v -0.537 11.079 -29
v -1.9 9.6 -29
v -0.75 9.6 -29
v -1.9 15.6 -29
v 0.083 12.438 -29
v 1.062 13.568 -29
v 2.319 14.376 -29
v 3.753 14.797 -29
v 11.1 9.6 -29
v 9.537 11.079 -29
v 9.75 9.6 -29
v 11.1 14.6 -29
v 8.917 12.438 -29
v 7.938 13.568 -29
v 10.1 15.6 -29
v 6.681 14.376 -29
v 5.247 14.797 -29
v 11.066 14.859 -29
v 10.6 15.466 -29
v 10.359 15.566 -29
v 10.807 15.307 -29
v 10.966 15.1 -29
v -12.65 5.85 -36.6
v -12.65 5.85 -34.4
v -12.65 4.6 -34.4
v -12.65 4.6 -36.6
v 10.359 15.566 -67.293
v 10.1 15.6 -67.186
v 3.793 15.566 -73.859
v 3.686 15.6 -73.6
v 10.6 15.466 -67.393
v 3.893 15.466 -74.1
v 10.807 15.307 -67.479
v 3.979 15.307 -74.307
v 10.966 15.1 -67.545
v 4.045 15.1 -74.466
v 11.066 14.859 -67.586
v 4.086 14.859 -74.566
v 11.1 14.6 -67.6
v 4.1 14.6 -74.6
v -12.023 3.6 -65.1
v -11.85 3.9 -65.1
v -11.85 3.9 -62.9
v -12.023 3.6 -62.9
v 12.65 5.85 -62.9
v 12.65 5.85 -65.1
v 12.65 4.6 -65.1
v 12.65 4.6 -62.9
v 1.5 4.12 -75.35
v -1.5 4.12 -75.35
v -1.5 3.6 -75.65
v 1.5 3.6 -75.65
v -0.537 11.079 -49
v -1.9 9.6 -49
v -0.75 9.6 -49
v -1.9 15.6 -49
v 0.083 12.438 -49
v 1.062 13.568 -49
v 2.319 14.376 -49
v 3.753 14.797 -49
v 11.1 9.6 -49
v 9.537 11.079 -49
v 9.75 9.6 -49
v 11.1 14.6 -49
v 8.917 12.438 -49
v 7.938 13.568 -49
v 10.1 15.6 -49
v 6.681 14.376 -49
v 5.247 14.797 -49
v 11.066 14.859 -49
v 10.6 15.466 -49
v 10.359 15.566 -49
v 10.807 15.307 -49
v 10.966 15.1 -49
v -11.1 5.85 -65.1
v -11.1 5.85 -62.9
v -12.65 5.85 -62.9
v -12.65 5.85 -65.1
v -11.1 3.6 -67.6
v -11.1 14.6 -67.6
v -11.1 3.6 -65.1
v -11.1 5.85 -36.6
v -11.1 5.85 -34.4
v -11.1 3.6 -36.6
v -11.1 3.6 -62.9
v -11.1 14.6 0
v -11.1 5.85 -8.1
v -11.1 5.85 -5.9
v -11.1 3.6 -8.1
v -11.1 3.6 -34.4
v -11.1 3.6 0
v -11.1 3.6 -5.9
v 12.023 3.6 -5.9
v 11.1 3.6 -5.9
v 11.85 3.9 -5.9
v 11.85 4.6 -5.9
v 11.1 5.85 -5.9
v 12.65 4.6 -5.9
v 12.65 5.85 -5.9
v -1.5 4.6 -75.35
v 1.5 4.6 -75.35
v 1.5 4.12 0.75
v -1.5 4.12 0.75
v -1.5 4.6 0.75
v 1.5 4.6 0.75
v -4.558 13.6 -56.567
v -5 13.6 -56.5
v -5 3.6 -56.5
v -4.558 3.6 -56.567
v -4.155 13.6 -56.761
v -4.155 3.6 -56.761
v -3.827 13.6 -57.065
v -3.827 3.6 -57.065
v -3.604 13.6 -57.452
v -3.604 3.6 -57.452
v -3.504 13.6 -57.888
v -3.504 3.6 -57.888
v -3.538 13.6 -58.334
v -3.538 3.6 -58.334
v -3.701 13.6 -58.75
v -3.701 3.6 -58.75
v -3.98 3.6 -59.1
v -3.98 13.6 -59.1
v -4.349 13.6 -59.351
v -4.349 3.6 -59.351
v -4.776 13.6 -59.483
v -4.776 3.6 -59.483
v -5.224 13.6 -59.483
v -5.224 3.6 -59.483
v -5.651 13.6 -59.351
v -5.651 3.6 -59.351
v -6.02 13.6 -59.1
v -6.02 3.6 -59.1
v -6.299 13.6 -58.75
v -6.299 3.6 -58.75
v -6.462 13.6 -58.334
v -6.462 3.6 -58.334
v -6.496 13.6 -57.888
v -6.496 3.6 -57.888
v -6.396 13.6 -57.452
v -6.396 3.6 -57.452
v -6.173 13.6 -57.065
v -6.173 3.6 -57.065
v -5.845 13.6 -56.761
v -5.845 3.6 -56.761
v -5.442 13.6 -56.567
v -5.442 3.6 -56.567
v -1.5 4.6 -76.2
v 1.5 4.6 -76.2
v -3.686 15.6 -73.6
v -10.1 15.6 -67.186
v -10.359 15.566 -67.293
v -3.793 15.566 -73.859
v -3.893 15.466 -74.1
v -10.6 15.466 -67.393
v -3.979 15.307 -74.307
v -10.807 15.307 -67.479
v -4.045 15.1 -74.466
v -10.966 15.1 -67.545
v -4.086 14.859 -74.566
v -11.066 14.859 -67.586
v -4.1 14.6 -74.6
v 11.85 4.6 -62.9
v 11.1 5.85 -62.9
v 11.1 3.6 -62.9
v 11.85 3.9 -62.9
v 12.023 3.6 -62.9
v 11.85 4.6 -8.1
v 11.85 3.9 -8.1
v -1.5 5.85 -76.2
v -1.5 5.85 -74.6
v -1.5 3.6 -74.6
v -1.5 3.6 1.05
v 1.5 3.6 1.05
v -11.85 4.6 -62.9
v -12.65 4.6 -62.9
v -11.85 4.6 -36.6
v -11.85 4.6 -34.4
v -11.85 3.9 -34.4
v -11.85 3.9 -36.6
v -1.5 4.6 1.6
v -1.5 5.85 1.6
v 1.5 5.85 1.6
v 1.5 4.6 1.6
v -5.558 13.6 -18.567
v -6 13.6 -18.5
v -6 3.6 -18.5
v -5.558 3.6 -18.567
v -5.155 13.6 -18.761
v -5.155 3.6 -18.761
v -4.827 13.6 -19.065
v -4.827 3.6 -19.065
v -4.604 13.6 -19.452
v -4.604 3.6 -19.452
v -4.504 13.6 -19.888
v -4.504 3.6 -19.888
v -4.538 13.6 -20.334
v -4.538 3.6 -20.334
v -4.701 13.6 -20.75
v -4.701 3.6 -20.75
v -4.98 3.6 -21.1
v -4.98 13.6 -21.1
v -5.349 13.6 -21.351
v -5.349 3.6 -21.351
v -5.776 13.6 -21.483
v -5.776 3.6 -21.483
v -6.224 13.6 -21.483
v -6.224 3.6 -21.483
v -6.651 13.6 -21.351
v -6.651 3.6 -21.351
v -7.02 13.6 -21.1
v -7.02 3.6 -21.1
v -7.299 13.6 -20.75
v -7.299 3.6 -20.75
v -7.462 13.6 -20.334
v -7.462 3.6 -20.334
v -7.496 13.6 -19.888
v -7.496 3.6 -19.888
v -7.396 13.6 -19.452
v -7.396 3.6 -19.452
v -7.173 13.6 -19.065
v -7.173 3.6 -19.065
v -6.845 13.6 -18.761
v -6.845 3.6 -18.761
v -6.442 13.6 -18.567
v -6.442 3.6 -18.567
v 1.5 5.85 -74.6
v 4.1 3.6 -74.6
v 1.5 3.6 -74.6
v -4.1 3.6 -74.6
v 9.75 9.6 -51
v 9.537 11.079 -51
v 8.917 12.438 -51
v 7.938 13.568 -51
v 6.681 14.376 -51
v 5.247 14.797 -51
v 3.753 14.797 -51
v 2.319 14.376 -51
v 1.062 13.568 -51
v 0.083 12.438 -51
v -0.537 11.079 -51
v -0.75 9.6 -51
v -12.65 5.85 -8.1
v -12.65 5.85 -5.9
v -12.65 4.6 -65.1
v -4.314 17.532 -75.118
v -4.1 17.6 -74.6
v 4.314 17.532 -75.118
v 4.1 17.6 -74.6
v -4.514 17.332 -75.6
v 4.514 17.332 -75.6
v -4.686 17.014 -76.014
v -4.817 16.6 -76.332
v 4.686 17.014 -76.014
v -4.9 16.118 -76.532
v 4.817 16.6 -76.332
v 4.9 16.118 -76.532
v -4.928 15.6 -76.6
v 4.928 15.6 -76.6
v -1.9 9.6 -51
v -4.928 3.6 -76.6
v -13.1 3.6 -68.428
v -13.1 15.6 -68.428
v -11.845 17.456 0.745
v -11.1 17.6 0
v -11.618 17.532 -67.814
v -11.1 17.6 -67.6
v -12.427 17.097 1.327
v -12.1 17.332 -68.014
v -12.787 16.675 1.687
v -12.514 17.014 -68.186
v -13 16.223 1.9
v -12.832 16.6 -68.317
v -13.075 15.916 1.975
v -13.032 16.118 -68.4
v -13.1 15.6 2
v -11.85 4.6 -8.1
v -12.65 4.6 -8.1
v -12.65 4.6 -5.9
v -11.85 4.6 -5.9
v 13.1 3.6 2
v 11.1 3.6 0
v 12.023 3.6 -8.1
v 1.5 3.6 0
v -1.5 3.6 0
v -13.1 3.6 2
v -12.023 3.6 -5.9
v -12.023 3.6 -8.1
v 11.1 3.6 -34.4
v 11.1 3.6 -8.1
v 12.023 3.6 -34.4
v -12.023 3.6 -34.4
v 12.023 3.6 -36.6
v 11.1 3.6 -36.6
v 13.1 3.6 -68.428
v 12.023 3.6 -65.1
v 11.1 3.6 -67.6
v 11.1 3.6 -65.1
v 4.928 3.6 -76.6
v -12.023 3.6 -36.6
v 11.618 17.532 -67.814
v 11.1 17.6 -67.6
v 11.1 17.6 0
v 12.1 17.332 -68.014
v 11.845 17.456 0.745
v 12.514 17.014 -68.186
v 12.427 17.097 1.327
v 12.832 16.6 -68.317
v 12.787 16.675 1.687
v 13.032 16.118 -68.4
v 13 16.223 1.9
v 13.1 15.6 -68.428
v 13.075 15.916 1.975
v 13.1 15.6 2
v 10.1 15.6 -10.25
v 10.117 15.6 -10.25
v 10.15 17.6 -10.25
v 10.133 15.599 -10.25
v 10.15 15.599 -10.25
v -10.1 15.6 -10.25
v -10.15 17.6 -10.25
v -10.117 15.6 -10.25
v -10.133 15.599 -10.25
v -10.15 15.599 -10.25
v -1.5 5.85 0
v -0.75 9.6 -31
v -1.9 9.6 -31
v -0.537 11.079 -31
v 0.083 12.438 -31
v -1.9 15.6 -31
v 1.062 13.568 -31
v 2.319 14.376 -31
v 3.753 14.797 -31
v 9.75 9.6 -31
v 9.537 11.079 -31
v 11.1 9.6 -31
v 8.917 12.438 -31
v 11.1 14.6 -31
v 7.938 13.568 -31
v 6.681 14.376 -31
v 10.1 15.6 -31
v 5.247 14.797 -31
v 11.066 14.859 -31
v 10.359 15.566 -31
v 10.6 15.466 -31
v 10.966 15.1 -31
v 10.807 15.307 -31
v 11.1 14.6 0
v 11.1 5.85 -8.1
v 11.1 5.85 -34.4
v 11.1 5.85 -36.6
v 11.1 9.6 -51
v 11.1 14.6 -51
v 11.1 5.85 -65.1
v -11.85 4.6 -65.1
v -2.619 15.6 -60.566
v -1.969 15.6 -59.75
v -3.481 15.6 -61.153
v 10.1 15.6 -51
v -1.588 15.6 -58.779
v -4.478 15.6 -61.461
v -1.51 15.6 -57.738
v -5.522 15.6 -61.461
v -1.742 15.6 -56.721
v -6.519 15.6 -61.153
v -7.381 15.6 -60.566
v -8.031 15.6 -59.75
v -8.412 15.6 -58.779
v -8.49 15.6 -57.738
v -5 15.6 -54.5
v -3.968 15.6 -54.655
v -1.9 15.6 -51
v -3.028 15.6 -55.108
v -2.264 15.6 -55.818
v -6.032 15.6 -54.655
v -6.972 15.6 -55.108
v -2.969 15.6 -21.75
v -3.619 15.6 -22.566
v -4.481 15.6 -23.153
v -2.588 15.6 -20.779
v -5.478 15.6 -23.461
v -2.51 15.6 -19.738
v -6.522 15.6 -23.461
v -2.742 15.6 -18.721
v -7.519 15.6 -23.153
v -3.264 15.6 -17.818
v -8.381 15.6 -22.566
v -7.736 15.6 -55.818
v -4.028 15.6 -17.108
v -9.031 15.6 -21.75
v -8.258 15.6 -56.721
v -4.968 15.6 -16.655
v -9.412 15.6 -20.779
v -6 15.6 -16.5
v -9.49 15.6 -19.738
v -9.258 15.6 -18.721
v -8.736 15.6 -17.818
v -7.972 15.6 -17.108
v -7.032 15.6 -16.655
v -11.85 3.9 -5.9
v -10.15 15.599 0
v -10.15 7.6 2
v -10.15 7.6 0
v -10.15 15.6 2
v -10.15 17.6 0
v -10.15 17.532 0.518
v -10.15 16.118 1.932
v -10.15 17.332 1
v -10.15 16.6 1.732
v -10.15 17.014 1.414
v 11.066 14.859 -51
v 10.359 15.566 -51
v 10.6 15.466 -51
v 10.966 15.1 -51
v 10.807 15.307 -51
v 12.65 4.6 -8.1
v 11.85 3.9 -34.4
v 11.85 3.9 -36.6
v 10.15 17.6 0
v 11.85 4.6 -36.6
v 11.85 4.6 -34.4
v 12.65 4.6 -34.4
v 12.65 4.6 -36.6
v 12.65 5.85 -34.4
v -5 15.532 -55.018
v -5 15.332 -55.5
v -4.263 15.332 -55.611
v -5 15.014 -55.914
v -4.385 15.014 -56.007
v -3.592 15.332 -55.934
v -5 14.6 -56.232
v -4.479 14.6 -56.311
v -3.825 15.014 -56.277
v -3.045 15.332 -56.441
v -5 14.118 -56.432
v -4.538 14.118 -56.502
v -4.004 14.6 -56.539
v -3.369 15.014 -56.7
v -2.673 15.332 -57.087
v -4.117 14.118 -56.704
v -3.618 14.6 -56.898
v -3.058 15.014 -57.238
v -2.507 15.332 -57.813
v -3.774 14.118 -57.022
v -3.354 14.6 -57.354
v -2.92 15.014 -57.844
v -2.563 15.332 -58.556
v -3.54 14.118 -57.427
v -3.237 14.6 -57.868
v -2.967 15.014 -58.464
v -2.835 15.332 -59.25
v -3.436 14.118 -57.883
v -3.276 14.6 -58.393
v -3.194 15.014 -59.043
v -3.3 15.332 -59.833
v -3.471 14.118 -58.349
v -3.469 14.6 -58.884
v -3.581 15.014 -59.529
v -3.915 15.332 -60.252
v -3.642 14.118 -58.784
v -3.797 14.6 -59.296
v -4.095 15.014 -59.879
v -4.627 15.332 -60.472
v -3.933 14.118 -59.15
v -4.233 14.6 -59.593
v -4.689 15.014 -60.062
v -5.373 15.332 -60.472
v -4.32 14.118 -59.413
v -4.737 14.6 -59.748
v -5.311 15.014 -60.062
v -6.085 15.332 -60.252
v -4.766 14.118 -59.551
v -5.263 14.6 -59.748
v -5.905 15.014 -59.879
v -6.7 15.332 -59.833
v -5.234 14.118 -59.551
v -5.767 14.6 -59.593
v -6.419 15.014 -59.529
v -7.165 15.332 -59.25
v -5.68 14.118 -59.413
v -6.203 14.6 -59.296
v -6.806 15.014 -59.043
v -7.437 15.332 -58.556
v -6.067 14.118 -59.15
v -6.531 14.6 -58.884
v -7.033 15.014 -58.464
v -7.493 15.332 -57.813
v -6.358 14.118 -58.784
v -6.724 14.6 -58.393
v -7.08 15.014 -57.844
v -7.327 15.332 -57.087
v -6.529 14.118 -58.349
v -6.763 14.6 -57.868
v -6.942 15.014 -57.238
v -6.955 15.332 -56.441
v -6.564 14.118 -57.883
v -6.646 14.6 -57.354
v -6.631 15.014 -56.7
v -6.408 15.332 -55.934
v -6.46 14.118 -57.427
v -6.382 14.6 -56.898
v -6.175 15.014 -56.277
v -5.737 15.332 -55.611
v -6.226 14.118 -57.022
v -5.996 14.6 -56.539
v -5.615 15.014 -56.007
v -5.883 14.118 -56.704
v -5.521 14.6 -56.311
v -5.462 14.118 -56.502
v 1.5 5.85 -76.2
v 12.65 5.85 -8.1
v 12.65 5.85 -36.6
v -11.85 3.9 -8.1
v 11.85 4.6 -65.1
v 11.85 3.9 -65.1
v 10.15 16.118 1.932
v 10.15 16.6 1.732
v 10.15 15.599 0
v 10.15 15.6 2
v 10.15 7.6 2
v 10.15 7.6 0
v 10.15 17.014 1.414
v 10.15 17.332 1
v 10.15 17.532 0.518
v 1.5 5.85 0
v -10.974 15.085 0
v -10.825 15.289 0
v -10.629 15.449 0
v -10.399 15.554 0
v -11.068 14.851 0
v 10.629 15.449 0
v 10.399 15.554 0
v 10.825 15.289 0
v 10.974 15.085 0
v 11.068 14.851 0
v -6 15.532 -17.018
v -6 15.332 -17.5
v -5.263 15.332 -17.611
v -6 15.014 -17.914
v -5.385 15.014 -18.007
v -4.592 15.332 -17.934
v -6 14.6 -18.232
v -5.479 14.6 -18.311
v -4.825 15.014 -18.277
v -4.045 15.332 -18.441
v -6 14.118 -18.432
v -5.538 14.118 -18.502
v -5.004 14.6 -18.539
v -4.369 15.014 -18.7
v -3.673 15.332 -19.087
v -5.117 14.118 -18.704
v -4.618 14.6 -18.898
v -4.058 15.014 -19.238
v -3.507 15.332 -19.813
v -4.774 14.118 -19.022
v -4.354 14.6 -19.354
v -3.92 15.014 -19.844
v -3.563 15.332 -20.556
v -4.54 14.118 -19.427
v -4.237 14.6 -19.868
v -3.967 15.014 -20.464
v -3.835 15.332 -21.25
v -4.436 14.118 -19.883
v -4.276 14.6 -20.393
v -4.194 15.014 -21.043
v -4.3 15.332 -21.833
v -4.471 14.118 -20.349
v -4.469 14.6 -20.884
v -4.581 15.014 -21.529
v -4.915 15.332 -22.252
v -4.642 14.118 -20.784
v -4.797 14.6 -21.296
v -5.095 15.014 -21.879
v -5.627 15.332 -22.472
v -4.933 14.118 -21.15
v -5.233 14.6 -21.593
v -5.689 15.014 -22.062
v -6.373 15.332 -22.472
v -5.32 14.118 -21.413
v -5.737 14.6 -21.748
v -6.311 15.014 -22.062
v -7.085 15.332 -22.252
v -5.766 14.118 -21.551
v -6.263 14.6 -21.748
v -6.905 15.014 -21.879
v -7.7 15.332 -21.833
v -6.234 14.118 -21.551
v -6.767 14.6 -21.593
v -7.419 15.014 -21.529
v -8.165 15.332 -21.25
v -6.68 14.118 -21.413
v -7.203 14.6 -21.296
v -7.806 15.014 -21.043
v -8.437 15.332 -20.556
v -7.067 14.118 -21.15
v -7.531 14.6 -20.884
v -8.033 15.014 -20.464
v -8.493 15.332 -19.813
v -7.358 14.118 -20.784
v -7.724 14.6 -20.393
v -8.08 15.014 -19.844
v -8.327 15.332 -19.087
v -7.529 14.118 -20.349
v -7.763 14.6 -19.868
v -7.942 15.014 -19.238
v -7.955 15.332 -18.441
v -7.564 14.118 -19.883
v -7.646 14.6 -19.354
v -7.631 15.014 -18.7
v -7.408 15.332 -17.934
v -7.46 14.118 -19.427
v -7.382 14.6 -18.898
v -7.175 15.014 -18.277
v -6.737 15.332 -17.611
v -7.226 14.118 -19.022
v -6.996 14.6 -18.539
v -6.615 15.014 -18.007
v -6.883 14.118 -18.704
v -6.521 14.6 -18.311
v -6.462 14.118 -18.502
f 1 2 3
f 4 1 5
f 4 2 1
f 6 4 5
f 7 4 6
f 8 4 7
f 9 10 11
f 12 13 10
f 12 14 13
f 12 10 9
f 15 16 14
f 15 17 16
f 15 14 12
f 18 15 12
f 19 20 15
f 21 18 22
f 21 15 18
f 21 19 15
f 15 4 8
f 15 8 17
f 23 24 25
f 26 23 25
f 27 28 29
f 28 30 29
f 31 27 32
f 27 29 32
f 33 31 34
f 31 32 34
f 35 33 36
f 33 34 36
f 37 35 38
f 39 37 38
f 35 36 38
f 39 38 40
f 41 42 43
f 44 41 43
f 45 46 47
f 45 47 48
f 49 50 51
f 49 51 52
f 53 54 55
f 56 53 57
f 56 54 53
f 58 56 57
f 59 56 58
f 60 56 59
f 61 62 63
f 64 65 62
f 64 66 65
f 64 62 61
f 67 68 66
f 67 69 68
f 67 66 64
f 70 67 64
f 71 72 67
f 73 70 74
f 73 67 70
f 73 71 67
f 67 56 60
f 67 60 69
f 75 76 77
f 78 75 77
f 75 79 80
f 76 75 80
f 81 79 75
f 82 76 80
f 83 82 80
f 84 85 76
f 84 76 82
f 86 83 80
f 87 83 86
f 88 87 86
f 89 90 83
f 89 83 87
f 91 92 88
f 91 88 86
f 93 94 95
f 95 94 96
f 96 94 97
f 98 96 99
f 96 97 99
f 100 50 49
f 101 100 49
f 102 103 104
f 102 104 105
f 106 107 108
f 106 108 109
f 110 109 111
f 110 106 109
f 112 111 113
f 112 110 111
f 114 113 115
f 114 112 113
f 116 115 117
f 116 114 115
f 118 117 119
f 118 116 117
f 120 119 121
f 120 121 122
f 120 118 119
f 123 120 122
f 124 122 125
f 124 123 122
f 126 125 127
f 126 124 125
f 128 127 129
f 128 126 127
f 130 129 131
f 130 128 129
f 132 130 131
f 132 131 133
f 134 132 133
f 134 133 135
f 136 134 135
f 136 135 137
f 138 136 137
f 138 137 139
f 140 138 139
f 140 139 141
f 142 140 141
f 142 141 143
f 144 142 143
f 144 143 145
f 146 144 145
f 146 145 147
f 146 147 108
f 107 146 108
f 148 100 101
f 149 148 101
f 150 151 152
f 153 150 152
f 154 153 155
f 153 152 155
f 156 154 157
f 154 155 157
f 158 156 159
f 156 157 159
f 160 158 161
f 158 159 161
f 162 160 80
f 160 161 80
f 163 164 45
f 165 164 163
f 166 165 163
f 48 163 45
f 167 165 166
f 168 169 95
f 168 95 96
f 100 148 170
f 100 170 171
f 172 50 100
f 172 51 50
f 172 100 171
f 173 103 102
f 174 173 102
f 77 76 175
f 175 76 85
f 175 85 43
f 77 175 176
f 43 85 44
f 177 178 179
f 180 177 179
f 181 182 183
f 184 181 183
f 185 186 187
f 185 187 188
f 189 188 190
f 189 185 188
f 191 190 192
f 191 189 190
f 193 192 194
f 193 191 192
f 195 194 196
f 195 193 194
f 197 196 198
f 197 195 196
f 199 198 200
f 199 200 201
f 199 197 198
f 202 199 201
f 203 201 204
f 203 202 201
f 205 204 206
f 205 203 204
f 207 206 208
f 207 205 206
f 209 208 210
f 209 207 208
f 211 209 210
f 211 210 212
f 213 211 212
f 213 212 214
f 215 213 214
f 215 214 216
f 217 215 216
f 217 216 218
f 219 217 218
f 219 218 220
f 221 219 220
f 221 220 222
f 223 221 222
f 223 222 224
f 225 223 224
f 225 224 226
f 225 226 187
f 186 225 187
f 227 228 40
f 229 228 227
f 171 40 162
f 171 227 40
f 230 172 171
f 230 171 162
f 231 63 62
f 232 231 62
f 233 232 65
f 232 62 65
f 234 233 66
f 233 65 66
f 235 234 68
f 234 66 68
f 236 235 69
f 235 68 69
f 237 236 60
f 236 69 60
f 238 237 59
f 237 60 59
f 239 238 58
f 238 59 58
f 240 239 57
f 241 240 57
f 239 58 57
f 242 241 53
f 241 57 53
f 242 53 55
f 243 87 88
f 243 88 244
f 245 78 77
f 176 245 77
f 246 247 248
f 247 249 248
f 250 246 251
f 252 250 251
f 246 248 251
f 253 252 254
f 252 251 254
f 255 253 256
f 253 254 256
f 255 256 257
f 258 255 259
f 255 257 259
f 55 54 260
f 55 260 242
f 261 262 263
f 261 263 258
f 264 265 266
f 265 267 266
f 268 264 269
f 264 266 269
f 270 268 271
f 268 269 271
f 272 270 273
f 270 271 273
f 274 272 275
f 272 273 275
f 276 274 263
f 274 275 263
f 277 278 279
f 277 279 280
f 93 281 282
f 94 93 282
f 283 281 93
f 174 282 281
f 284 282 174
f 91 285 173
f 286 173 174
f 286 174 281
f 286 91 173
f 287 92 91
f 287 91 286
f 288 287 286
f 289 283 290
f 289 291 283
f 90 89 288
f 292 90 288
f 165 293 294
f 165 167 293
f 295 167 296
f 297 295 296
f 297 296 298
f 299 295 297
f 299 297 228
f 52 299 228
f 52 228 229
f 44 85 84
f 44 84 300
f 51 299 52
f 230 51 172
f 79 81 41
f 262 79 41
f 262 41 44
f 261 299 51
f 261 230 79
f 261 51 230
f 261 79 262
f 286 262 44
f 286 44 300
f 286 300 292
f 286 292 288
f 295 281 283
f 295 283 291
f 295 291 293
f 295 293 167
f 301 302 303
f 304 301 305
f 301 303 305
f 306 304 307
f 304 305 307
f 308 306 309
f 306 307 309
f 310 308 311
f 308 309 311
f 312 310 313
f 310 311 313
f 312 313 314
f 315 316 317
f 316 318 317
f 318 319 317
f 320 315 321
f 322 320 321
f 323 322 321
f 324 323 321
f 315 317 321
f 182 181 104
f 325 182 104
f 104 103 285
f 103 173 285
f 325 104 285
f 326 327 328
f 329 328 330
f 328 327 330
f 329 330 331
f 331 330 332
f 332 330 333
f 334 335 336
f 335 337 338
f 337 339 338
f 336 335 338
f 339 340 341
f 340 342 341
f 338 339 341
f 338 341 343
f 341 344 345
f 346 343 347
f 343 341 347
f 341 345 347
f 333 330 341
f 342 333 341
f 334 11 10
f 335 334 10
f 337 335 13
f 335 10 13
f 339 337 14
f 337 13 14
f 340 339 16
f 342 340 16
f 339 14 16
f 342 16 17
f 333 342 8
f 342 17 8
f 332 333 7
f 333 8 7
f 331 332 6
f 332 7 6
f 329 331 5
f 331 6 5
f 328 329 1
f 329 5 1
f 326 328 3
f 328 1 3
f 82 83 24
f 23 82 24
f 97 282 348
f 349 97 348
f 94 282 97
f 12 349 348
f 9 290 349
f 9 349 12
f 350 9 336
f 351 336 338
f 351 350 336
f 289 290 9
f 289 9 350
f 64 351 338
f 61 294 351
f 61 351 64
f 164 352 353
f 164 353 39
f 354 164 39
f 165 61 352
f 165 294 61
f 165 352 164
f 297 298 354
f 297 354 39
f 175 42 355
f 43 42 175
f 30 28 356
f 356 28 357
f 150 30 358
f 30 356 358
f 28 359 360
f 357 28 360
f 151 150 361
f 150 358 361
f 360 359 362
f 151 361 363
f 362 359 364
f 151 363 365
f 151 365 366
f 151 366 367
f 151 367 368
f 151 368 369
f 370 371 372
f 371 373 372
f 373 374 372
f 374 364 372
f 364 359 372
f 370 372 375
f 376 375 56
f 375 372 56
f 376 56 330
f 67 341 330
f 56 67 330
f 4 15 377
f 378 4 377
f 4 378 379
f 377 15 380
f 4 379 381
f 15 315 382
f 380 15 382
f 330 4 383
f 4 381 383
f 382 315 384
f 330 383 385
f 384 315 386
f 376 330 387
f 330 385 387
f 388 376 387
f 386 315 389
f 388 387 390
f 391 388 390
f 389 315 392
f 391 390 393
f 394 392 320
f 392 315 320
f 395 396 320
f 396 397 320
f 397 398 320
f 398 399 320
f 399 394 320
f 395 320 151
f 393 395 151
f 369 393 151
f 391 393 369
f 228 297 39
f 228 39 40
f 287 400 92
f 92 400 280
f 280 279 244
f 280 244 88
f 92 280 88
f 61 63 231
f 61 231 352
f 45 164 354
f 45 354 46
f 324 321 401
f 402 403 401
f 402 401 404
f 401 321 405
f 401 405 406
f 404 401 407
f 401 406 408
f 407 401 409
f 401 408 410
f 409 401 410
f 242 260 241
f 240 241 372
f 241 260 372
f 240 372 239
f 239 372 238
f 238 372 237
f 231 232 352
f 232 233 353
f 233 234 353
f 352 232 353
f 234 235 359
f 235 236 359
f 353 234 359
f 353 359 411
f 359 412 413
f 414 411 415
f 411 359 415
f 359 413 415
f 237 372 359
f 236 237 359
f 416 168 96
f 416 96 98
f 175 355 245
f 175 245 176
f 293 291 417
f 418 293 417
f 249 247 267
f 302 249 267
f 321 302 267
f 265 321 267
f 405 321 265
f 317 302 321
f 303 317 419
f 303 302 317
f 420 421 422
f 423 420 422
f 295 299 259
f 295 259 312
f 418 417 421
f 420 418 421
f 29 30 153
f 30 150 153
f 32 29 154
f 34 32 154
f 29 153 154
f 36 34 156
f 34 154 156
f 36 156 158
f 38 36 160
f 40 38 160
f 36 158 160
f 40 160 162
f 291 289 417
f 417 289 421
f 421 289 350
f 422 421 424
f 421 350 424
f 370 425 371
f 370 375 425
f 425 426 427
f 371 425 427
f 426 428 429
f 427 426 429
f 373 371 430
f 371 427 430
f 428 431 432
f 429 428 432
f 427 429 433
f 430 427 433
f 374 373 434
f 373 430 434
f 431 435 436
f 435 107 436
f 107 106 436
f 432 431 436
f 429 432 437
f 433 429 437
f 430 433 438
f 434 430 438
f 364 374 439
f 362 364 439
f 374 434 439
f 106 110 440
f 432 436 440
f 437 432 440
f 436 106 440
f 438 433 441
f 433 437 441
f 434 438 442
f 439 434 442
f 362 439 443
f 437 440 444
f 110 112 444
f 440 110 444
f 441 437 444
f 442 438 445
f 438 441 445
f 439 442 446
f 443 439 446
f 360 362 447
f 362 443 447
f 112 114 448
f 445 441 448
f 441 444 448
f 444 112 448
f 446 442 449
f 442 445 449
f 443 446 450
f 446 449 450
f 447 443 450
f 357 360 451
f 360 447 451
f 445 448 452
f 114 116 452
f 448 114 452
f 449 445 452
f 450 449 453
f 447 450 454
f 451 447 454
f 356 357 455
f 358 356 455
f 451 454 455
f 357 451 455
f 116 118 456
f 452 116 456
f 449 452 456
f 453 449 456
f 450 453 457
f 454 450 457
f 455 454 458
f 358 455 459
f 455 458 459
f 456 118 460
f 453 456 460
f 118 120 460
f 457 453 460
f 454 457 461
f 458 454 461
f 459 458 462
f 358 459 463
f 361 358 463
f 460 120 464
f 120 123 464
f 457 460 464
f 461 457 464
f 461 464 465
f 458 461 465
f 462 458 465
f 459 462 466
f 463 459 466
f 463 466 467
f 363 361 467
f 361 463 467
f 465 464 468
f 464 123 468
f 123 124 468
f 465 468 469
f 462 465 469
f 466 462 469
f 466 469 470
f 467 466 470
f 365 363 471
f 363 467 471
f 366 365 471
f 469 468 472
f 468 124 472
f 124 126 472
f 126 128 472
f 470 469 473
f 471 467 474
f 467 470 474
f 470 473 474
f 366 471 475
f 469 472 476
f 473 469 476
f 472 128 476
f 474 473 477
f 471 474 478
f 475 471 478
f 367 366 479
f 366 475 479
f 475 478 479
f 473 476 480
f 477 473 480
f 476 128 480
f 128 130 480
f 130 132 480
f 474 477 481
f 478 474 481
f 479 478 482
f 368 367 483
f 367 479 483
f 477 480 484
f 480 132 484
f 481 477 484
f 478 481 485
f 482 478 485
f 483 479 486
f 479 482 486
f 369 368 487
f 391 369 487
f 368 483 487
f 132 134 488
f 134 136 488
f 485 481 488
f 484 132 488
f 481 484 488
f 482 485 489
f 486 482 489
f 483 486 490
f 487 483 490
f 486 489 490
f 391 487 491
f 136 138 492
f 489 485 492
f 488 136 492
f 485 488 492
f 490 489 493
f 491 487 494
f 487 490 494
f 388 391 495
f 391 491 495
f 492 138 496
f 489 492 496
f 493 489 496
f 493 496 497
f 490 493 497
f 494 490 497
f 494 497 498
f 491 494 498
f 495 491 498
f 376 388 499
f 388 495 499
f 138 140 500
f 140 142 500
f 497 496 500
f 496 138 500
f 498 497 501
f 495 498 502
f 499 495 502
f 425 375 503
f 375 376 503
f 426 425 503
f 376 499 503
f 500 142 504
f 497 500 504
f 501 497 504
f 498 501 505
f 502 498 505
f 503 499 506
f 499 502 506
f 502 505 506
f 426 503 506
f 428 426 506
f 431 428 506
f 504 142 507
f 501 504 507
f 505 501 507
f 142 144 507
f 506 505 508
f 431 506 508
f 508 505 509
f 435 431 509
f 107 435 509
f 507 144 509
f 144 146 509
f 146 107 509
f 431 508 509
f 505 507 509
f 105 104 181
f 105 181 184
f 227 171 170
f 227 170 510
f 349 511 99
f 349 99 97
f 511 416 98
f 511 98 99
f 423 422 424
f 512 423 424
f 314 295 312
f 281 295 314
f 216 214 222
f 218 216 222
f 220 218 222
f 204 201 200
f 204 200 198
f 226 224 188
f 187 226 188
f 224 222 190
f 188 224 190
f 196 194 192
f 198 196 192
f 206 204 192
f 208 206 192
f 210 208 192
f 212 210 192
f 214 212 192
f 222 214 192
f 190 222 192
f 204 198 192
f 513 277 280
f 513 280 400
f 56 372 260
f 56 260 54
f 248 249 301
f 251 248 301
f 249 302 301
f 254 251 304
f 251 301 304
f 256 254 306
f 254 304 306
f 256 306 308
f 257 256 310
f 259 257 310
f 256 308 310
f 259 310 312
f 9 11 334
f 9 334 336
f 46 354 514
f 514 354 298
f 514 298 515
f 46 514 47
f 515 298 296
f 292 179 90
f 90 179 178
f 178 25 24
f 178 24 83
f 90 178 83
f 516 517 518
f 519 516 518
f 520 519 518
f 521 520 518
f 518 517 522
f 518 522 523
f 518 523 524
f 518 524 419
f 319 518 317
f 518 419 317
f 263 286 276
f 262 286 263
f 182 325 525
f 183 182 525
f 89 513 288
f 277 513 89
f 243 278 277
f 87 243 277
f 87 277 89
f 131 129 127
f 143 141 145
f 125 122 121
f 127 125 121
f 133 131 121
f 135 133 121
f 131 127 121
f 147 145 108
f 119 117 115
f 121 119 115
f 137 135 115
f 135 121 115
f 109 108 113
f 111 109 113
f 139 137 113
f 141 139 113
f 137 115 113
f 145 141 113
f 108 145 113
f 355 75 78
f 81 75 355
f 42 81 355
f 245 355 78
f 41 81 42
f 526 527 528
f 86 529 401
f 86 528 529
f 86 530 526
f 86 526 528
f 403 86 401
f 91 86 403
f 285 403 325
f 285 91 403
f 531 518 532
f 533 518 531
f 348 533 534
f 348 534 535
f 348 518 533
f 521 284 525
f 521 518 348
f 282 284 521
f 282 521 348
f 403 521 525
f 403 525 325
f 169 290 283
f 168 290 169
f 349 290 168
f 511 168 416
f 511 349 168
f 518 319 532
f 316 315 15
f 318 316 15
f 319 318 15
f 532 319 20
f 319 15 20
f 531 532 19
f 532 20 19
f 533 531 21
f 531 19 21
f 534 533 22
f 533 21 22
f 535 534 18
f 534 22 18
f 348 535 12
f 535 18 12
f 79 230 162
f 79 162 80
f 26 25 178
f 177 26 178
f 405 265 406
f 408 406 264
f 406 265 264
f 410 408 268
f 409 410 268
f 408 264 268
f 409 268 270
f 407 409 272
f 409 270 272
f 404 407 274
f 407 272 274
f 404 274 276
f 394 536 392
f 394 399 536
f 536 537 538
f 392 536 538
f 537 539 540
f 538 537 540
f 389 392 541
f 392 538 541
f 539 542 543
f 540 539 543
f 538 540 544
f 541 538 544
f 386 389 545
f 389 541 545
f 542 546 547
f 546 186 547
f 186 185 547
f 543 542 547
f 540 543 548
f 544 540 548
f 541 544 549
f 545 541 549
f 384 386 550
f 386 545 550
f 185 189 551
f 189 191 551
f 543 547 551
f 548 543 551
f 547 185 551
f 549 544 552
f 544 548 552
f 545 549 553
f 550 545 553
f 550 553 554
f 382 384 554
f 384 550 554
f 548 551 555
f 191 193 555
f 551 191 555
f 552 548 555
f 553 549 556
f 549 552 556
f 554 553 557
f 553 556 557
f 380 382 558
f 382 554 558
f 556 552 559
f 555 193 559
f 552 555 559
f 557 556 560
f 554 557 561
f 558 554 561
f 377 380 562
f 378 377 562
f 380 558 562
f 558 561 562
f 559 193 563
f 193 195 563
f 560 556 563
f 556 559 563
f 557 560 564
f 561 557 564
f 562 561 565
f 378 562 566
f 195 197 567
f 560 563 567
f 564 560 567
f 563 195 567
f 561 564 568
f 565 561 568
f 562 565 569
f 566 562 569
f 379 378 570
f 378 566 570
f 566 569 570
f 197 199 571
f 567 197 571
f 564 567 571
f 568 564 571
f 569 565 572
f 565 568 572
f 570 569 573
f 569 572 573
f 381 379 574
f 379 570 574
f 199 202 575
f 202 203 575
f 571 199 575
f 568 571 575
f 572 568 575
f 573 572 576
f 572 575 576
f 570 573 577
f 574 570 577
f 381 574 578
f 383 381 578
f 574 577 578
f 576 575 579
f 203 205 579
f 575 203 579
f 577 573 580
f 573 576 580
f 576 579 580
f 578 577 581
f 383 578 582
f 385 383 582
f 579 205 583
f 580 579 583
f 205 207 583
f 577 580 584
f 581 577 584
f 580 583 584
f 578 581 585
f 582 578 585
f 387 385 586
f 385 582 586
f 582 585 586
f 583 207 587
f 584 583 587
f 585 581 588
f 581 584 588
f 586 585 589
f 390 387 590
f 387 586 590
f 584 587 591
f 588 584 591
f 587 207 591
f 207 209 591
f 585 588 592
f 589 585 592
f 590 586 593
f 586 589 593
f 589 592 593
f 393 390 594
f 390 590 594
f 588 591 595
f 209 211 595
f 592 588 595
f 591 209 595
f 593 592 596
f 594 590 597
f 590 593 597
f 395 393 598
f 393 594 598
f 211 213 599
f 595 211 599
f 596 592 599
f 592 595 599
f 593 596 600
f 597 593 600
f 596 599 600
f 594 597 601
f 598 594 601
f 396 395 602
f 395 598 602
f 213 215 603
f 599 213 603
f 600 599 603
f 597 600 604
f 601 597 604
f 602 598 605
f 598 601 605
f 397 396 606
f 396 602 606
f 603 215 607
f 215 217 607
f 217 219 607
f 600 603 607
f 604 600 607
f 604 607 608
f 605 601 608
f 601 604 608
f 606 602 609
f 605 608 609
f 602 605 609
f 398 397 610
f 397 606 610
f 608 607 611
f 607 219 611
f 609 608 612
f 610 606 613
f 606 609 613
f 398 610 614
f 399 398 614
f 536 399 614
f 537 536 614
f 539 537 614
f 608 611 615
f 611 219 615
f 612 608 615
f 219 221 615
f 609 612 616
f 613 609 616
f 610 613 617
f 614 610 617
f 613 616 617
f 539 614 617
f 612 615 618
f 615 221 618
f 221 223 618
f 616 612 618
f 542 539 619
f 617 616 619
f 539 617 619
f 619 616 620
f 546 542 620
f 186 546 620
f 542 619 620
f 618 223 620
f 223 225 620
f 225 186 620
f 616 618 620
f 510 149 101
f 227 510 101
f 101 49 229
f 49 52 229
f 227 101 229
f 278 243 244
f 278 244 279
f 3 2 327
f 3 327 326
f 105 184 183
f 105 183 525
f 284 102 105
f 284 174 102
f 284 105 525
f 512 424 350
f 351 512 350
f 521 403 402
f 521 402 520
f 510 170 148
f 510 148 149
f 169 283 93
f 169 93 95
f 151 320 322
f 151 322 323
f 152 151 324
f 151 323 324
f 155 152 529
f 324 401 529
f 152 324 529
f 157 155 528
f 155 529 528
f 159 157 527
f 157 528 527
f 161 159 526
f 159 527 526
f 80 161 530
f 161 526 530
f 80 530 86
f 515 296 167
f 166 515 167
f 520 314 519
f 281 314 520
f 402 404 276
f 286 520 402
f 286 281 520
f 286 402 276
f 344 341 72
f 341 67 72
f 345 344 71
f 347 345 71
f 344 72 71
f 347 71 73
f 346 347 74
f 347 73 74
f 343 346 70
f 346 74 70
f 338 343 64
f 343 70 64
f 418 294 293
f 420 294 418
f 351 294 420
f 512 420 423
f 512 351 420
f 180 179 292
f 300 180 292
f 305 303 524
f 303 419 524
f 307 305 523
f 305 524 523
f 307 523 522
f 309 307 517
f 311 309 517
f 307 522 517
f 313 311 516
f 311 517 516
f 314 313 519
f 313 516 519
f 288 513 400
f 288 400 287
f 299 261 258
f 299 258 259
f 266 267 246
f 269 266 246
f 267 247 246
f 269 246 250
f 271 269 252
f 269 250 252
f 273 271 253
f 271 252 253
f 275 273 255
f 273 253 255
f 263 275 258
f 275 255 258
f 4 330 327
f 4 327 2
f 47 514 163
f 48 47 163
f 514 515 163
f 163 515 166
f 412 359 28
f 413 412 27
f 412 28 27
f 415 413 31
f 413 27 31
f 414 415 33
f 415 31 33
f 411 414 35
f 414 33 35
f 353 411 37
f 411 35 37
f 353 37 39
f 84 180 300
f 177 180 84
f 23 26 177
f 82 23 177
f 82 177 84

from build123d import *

# Parameters (mm, degrees)
BOSS_EXTRUDE1_DEPTH       = 14
CUT_EXTRUDE1_DEPTH        = 12
SKETCH3_W                 = 1.75
SKETCH3_H                 = 2.2
CUT_EXTRUDE2_DEPTH        = 2.25
SKETCH5_W                 = 2.2
SKETCH5_H                 = 1.25
CUT_EXTRUDE3_DEPTH        = 0.8
CHAMFER1_SIZE             = 0.3
CHAMFER1_SIZE2            = 0.173205081
CHAMFER1_OF_MIRROR1_SIZE2 = 0.3
CHAMFER1_OF_MIRROR1_SIZE  = 0.173205081
LPATTERN1_START           = -36.6
LPATTERN1_DEPTH           = 2.2
LPATTERN1_START_2         = -8.1
LPATTERN1_2_DEPTH         = 2.2
SKETCH7_W                 = 3
SKETCH7_H                 = 1.75
CUT_EXTRUDE4_DEPTH        = 2.25
CHAMFER2_SIZE             = 0.3
CHAMFER2_SIZE2            = 0.519615242
SKETCH8_W                 = 3
SKETCH8_H                 = 1.25
CUT_EXTRUDE5_DEPTH        = 0.85
CHAMFER2_OF_MIRROR2_SIZE2 = 0.519615242
CHAMFER2_OF_MIRROR2_SIZE  = 0.3
SKETCH9_W                 = 13
SKETCH9_H                 = 2
BOSS_EXTRUDE2_DEPTH       = 6
CUT_EXTRUDE9_REACH        = 54.413
SKETCH10_R                = 5.25
SKETCH11_R                = 1.5
BOSS_EXTRUDE3_DEPTH       = 14
CUT_EXTRUDE10_DEPTH       = 10
FILLET1_R                 = 2
FILLET2_R                 = 1
FILLET3_R                 = 2


# Read off the part's stored shape, not the designer's step: LPattern1
with BuildPart() as part:
    # Sketch1 → Boss-Extrude1 (new body)
    with BuildSketch(Plane(origin=(0, 3.6, 0), x_dir=(1, 0, 0), z_dir=(0, 1, 0))):
        Polygon((-13.1, -2), (-13.1, 68.428427125), (-4.928427125, 76.6), (4.928427125, 76.6), (13.1, 68.428427125), (13.1, -2), align=None)
    extrude(amount=BOSS_EXTRUDE1_DEPTH)

    # Sketch2 → Cut-Extrude1 (cut)
    with BuildSketch(Plane.XZ.offset(-3.6)):
        Polygon((11.1, -67.6), (4.1, -74.6), (-4.1, -74.6), (-11.1, -67.6), (-11.1, 0), (11.1, 0), align=None)
    extrude(amount=-CUT_EXTRUDE1_DEPTH, mode=Mode.SUBTRACT)

    # Sketch3 → Cut-Extrude2 (cut)
    with BuildSketch(Plane.XZ.offset(-3.6)):
        with Locations((10.975, -64)):
            Rectangle(SKETCH3_W, SKETCH3_H)
    cut_extrude2 = extrude(amount=-CUT_EXTRUDE2_DEPTH, mode=Mode.SUBTRACT)

    # Sketch5 → Cut-Extrude3 (cut)
    with BuildSketch(Plane.ZY.offset(-11.85)):
        with Locations((-64, 5.225)):
            Rectangle(SKETCH5_W, SKETCH5_H)
    cut_extrude3 = extrude(amount=-CUT_EXTRUDE3_DEPTH, mode=Mode.SUBTRACT)

    # Chamfer1
    chamfer1_edges = [part.edges().sort_by_distance(p)[0] for p in [
        (11.85, 3.6, -64),
    ]]
    chamfer1_side = [part.faces().sort_by_distance(p)[0] for p in [
        (11.85, 4.1, -64),
    ]]
    chamfer(chamfer1_edges, length=CHAMFER1_SIZE, length2=CHAMFER1_SIZE2, reference=chamfer1_side[0])

    # Mirror1: Cut-Extrude2, Cut-Extrude3 across plane
    add(cut_extrude2.mirror(Plane(origin=(0, 0, 0), x_dir=(0, 0, 1), z_dir=(1, 0, 0))), mode=Mode.SUBTRACT)
    add(cut_extrude3.mirror(Plane(origin=(0, 0, 0), x_dir=(0, 0, 1), z_dir=(1, 0, 0))), mode=Mode.SUBTRACT)

    # Chamfer1 of Mirror1
    chamfer1_of_mirror1_edges = [part.edges().sort_by_distance(p)[0] for p in [
        (-11.85, 3.6, -64),
    ]]
    chamfer(chamfer1_of_mirror1_edges, length=CHAMFER1_OF_MIRROR1_SIZE, length2=CHAMFER1_OF_MIRROR1_SIZE2)

    # LPattern1 outline → LPattern1 (cut)
    with BuildSketch(Plane.XY.offset(LPATTERN1_START)):
        Polygon((-12.023205081, 3.6), (-11.1, 3.6), (-11.1, 5.85), (-12.65, 5.85), (-12.65, 4.6), (-11.85, 4.6), (-11.85, 3.9), align=None)
        Polygon((11.85, 3.9), (11.85, 4.6), (12.65, 4.6), (12.65, 5.85), (11.1, 5.85), (11.1, 3.6), (12.023205081, 3.6), align=None)
    extrude(amount=LPATTERN1_DEPTH, mode=Mode.SUBTRACT)

    # LPattern1 2 outline → LPattern1 2 (cut)
    with BuildSketch(Plane.XY.offset(LPATTERN1_START_2)):
        Polygon((-12.023205081, 3.6), (-11.1, 3.6), (-11.1, 5.85), (-12.65, 5.85), (-12.65, 4.6), (-11.85, 4.6), (-11.85, 3.9), align=None)
        Polygon((11.85, 3.9), (11.85, 4.6), (12.65, 4.6), (12.65, 5.85), (11.1, 5.85), (11.1, 3.6), (12.023205081, 3.6), align=None)
    extrude(amount=LPATTERN1_2_DEPTH, mode=Mode.SUBTRACT)

    # Sketch7 → Cut-Extrude4 (cut)
    with BuildSketch(Plane.XZ.offset(-3.6)):
        with Locations((0, -74.475)):
            Rectangle(SKETCH7_W, SKETCH7_H)
    cut_extrude4 = extrude(amount=-CUT_EXTRUDE4_DEPTH, mode=Mode.SUBTRACT)

    # Chamfer2
    chamfer2_edges = [part.edges().sort_by_distance(p)[0] for p in [
        (0, 3.6, -75.35),
    ]]
    chamfer2_side = [part.faces().sort_by_distance(p)[0] for p in [
        (-12.271483253, 3.6, -33.214213562),
    ]]
    chamfer(chamfer2_edges, length=CHAMFER2_SIZE, length2=CHAMFER2_SIZE2, reference=chamfer2_side[0])

    # Sketch8 → Cut-Extrude5 (cut)
    with BuildSketch(Plane.XY.offset(-75.35)):
        with Locations((0, 5.225)):
            Rectangle(SKETCH8_W, SKETCH8_H)
    cut_extrude5 = extrude(amount=-CUT_EXTRUDE5_DEPTH, mode=Mode.SUBTRACT)

    # Mirror2: Cut-Extrude4, Cut-Extrude5 across plane
    add(cut_extrude4.mirror(Plane.XY.offset(-37.3)), mode=Mode.SUBTRACT)
    add(cut_extrude5.mirror(Plane.XY.offset(-37.3)), mode=Mode.SUBTRACT)

    # Chamfer2 of Mirror2
    chamfer2_of_mirror2_edges = [part.edges().sort_by_distance(p)[0] for p in [
        (0, 3.6, 0.75),
    ]]
    chamfer(chamfer2_of_mirror2_edges, length=CHAMFER2_OF_MIRROR2_SIZE, length2=CHAMFER2_OF_MIRROR2_SIZE2)

    # Sketch9 → Boss-Extrude2 (add)
    with BuildSketch(Plane.XZ.offset(-15.6)):
        with Locations((4.6, -50)):
            Rectangle(SKETCH9_W, SKETCH9_H)
        with Locations((4.6, -30)):
            Rectangle(SKETCH9_W, SKETCH9_H)
    extrude(amount=BOSS_EXTRUDE2_DEPTH)

    # Cut-Extrude9: up to this face of the body (flat: up to its plane)
    cut_extrude9_end = Plane(part.part.faces().sort_by_distance((4.6, 12.6, -51))[0])
    # Sketch10 → Cut-Extrude9 (cut, up to the picked face)
    with BuildSketch(Plane.XY.offset(-29), mode=Mode.PRIVATE) as cut_extrude9_sk1:
        with Locations((4.5, 9.6)):
            Circle(SKETCH10_R)
    cut_extrude9_tool1 = split(extrude(cut_extrude9_sk1.sketch, amount=-CUT_EXTRUDE9_REACH, mode=Mode.PRIVATE), bisect_by=cut_extrude9_end, keep=Keep.BOTH, mode=Mode.PRIVATE)
    add(cut_extrude9_tool1.solids().sort_by(Axis((4.5, 9.6, -29), (0, 0, -1)))[0], mode=Mode.SUBTRACT)

    # Sketch11 → Boss-Extrude3 (add)
    with BuildSketch(Plane(origin=(0, 17.6, 0), x_dir=(1, 0, 0), z_dir=(0, 1, 0))):
        with Locations(Location((-6, 20, 0), (0, 0, 270))):
            Circle(SKETCH11_R)
        with Locations(Location((-5, 58, 0), (0, 0, 270))):
            Circle(SKETCH11_R)
    extrude(amount=-BOSS_EXTRUDE3_DEPTH)

    # Sketch12 → Cut-Extrude10 (cut)
    with BuildSketch(Plane(origin=(0, 17.6, 0), x_dir=(1, 0, 0), z_dir=(0, 1, 0))):
        Polygon((-10.15, 1.25), (-10.15, -2), (10.15, -2), (10.15, 1.25), (10.15, 10.25), (-10.15, 10.25), align=None)
    extrude(amount=-CUT_EXTRUDE10_DEPTH, mode=Mode.SUBTRACT)

    # Fillet1
    fillet1_edges = [part.edges().sort_by_distance(p)[0] for p in [
        (9.014213562, 17.6, -72.514213562),
        (0, 17.6, -76.6),
        (-9.014213562, 17.6, -72.514213562),
        (-13.1, 17.6, -33.214213562),
        (-11.625, 17.6, 2),
        (11.625, 17.6, 2),
        (13.1, 17.6, -33.214213562),
    ]]
    fillet(fillet1_edges, radius=FILLET1_R)

    # Fillet2
    fillet2_edges = [part.edges().sort_by_distance(p)[0] for p in [
        (11.1, 15.6, -59.3),
        (11.1, 15.6, -14.5),
        (7.6, 15.6, -71.1),
        (11.1, 15.6, -40),
        (-7.6, 15.6, -71.1),
        (-11.1, 15.6, -33.8),
        (0, 15.6, -74.6),
    ]]
    fillet(fillet2_edges, radius=FILLET2_R)

    # Fillet3
    fillet3_edges = [part.edges().sort_by_distance(p)[0] for p in [
        (-6, 15.6, -21.5),
        (-5, 15.6, -59.5),
    ]]
    fillet(fillet3_edges, radius=FILLET3_R)


solid = part.part
